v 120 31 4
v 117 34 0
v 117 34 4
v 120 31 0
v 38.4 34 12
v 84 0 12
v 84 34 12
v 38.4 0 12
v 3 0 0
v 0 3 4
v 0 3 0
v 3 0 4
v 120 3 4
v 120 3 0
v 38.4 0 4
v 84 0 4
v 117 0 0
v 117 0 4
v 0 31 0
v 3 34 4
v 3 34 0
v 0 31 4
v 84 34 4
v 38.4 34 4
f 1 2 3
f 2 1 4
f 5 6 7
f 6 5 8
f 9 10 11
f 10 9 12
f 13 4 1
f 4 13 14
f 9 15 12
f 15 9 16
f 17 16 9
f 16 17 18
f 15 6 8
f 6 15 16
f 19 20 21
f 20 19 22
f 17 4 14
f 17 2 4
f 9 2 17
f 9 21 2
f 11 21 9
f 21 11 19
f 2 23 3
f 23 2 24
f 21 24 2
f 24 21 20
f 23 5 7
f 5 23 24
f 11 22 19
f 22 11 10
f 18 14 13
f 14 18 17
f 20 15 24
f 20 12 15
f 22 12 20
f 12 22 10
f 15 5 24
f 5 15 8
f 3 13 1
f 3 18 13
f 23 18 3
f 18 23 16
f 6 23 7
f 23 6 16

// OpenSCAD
$fn = 32;

// ----------------------------------------------------------------------
// Stepped bar: centerstep, 120 x 34 x 12/4 mm
// ----------------------------------------------------------------------

// --- parameters (mm) ---
bar_l = 120;              // bar length, X
bar_w = 34;               // bar width, Y
plate_t = 12;             // thickness of the thick zone, Z
thin_t = 4;               // thickness of the thin zone
corner_c = 3;             // corner chamfer of the bar
step_cut = 8;             // material removed from the thin zone
thick_from = 38.4;        // start of the thick middle zone
thick_to = 84;            // end of the thick middle zone
depth_1 = 8;              // depth of cut 1 from the top face
depth_2 = 8;              // depth of cut 2 from the top face

profile = [[3, 0], [117, 0], [120, 3], [120, 31], [117, 34], [3, 34], [0, 31], [0, 3]];  // primary outline, 8 points, counter clockwise
void_1 = [[-1, -1], [38.4, -1], [38.4, 35], [-1, 35]];  // thin left end, 4 points
void_2 = [[84, -1], [121, -1], [121, 35], [84, 35]];  // thin right end, 4 points

// --- the one profile operation ---
difference() {
  linear_extrude(height = plate_t) polygon(points = profile);
  translate([0, 0, plate_t - depth_1])
    linear_extrude(height = depth_1 + 1) polygon(points = void_1);
  translate([0, 0, plate_t - depth_2])
    linear_extrude(height = depth_2 + 1) polygon(points = void_2);
}
